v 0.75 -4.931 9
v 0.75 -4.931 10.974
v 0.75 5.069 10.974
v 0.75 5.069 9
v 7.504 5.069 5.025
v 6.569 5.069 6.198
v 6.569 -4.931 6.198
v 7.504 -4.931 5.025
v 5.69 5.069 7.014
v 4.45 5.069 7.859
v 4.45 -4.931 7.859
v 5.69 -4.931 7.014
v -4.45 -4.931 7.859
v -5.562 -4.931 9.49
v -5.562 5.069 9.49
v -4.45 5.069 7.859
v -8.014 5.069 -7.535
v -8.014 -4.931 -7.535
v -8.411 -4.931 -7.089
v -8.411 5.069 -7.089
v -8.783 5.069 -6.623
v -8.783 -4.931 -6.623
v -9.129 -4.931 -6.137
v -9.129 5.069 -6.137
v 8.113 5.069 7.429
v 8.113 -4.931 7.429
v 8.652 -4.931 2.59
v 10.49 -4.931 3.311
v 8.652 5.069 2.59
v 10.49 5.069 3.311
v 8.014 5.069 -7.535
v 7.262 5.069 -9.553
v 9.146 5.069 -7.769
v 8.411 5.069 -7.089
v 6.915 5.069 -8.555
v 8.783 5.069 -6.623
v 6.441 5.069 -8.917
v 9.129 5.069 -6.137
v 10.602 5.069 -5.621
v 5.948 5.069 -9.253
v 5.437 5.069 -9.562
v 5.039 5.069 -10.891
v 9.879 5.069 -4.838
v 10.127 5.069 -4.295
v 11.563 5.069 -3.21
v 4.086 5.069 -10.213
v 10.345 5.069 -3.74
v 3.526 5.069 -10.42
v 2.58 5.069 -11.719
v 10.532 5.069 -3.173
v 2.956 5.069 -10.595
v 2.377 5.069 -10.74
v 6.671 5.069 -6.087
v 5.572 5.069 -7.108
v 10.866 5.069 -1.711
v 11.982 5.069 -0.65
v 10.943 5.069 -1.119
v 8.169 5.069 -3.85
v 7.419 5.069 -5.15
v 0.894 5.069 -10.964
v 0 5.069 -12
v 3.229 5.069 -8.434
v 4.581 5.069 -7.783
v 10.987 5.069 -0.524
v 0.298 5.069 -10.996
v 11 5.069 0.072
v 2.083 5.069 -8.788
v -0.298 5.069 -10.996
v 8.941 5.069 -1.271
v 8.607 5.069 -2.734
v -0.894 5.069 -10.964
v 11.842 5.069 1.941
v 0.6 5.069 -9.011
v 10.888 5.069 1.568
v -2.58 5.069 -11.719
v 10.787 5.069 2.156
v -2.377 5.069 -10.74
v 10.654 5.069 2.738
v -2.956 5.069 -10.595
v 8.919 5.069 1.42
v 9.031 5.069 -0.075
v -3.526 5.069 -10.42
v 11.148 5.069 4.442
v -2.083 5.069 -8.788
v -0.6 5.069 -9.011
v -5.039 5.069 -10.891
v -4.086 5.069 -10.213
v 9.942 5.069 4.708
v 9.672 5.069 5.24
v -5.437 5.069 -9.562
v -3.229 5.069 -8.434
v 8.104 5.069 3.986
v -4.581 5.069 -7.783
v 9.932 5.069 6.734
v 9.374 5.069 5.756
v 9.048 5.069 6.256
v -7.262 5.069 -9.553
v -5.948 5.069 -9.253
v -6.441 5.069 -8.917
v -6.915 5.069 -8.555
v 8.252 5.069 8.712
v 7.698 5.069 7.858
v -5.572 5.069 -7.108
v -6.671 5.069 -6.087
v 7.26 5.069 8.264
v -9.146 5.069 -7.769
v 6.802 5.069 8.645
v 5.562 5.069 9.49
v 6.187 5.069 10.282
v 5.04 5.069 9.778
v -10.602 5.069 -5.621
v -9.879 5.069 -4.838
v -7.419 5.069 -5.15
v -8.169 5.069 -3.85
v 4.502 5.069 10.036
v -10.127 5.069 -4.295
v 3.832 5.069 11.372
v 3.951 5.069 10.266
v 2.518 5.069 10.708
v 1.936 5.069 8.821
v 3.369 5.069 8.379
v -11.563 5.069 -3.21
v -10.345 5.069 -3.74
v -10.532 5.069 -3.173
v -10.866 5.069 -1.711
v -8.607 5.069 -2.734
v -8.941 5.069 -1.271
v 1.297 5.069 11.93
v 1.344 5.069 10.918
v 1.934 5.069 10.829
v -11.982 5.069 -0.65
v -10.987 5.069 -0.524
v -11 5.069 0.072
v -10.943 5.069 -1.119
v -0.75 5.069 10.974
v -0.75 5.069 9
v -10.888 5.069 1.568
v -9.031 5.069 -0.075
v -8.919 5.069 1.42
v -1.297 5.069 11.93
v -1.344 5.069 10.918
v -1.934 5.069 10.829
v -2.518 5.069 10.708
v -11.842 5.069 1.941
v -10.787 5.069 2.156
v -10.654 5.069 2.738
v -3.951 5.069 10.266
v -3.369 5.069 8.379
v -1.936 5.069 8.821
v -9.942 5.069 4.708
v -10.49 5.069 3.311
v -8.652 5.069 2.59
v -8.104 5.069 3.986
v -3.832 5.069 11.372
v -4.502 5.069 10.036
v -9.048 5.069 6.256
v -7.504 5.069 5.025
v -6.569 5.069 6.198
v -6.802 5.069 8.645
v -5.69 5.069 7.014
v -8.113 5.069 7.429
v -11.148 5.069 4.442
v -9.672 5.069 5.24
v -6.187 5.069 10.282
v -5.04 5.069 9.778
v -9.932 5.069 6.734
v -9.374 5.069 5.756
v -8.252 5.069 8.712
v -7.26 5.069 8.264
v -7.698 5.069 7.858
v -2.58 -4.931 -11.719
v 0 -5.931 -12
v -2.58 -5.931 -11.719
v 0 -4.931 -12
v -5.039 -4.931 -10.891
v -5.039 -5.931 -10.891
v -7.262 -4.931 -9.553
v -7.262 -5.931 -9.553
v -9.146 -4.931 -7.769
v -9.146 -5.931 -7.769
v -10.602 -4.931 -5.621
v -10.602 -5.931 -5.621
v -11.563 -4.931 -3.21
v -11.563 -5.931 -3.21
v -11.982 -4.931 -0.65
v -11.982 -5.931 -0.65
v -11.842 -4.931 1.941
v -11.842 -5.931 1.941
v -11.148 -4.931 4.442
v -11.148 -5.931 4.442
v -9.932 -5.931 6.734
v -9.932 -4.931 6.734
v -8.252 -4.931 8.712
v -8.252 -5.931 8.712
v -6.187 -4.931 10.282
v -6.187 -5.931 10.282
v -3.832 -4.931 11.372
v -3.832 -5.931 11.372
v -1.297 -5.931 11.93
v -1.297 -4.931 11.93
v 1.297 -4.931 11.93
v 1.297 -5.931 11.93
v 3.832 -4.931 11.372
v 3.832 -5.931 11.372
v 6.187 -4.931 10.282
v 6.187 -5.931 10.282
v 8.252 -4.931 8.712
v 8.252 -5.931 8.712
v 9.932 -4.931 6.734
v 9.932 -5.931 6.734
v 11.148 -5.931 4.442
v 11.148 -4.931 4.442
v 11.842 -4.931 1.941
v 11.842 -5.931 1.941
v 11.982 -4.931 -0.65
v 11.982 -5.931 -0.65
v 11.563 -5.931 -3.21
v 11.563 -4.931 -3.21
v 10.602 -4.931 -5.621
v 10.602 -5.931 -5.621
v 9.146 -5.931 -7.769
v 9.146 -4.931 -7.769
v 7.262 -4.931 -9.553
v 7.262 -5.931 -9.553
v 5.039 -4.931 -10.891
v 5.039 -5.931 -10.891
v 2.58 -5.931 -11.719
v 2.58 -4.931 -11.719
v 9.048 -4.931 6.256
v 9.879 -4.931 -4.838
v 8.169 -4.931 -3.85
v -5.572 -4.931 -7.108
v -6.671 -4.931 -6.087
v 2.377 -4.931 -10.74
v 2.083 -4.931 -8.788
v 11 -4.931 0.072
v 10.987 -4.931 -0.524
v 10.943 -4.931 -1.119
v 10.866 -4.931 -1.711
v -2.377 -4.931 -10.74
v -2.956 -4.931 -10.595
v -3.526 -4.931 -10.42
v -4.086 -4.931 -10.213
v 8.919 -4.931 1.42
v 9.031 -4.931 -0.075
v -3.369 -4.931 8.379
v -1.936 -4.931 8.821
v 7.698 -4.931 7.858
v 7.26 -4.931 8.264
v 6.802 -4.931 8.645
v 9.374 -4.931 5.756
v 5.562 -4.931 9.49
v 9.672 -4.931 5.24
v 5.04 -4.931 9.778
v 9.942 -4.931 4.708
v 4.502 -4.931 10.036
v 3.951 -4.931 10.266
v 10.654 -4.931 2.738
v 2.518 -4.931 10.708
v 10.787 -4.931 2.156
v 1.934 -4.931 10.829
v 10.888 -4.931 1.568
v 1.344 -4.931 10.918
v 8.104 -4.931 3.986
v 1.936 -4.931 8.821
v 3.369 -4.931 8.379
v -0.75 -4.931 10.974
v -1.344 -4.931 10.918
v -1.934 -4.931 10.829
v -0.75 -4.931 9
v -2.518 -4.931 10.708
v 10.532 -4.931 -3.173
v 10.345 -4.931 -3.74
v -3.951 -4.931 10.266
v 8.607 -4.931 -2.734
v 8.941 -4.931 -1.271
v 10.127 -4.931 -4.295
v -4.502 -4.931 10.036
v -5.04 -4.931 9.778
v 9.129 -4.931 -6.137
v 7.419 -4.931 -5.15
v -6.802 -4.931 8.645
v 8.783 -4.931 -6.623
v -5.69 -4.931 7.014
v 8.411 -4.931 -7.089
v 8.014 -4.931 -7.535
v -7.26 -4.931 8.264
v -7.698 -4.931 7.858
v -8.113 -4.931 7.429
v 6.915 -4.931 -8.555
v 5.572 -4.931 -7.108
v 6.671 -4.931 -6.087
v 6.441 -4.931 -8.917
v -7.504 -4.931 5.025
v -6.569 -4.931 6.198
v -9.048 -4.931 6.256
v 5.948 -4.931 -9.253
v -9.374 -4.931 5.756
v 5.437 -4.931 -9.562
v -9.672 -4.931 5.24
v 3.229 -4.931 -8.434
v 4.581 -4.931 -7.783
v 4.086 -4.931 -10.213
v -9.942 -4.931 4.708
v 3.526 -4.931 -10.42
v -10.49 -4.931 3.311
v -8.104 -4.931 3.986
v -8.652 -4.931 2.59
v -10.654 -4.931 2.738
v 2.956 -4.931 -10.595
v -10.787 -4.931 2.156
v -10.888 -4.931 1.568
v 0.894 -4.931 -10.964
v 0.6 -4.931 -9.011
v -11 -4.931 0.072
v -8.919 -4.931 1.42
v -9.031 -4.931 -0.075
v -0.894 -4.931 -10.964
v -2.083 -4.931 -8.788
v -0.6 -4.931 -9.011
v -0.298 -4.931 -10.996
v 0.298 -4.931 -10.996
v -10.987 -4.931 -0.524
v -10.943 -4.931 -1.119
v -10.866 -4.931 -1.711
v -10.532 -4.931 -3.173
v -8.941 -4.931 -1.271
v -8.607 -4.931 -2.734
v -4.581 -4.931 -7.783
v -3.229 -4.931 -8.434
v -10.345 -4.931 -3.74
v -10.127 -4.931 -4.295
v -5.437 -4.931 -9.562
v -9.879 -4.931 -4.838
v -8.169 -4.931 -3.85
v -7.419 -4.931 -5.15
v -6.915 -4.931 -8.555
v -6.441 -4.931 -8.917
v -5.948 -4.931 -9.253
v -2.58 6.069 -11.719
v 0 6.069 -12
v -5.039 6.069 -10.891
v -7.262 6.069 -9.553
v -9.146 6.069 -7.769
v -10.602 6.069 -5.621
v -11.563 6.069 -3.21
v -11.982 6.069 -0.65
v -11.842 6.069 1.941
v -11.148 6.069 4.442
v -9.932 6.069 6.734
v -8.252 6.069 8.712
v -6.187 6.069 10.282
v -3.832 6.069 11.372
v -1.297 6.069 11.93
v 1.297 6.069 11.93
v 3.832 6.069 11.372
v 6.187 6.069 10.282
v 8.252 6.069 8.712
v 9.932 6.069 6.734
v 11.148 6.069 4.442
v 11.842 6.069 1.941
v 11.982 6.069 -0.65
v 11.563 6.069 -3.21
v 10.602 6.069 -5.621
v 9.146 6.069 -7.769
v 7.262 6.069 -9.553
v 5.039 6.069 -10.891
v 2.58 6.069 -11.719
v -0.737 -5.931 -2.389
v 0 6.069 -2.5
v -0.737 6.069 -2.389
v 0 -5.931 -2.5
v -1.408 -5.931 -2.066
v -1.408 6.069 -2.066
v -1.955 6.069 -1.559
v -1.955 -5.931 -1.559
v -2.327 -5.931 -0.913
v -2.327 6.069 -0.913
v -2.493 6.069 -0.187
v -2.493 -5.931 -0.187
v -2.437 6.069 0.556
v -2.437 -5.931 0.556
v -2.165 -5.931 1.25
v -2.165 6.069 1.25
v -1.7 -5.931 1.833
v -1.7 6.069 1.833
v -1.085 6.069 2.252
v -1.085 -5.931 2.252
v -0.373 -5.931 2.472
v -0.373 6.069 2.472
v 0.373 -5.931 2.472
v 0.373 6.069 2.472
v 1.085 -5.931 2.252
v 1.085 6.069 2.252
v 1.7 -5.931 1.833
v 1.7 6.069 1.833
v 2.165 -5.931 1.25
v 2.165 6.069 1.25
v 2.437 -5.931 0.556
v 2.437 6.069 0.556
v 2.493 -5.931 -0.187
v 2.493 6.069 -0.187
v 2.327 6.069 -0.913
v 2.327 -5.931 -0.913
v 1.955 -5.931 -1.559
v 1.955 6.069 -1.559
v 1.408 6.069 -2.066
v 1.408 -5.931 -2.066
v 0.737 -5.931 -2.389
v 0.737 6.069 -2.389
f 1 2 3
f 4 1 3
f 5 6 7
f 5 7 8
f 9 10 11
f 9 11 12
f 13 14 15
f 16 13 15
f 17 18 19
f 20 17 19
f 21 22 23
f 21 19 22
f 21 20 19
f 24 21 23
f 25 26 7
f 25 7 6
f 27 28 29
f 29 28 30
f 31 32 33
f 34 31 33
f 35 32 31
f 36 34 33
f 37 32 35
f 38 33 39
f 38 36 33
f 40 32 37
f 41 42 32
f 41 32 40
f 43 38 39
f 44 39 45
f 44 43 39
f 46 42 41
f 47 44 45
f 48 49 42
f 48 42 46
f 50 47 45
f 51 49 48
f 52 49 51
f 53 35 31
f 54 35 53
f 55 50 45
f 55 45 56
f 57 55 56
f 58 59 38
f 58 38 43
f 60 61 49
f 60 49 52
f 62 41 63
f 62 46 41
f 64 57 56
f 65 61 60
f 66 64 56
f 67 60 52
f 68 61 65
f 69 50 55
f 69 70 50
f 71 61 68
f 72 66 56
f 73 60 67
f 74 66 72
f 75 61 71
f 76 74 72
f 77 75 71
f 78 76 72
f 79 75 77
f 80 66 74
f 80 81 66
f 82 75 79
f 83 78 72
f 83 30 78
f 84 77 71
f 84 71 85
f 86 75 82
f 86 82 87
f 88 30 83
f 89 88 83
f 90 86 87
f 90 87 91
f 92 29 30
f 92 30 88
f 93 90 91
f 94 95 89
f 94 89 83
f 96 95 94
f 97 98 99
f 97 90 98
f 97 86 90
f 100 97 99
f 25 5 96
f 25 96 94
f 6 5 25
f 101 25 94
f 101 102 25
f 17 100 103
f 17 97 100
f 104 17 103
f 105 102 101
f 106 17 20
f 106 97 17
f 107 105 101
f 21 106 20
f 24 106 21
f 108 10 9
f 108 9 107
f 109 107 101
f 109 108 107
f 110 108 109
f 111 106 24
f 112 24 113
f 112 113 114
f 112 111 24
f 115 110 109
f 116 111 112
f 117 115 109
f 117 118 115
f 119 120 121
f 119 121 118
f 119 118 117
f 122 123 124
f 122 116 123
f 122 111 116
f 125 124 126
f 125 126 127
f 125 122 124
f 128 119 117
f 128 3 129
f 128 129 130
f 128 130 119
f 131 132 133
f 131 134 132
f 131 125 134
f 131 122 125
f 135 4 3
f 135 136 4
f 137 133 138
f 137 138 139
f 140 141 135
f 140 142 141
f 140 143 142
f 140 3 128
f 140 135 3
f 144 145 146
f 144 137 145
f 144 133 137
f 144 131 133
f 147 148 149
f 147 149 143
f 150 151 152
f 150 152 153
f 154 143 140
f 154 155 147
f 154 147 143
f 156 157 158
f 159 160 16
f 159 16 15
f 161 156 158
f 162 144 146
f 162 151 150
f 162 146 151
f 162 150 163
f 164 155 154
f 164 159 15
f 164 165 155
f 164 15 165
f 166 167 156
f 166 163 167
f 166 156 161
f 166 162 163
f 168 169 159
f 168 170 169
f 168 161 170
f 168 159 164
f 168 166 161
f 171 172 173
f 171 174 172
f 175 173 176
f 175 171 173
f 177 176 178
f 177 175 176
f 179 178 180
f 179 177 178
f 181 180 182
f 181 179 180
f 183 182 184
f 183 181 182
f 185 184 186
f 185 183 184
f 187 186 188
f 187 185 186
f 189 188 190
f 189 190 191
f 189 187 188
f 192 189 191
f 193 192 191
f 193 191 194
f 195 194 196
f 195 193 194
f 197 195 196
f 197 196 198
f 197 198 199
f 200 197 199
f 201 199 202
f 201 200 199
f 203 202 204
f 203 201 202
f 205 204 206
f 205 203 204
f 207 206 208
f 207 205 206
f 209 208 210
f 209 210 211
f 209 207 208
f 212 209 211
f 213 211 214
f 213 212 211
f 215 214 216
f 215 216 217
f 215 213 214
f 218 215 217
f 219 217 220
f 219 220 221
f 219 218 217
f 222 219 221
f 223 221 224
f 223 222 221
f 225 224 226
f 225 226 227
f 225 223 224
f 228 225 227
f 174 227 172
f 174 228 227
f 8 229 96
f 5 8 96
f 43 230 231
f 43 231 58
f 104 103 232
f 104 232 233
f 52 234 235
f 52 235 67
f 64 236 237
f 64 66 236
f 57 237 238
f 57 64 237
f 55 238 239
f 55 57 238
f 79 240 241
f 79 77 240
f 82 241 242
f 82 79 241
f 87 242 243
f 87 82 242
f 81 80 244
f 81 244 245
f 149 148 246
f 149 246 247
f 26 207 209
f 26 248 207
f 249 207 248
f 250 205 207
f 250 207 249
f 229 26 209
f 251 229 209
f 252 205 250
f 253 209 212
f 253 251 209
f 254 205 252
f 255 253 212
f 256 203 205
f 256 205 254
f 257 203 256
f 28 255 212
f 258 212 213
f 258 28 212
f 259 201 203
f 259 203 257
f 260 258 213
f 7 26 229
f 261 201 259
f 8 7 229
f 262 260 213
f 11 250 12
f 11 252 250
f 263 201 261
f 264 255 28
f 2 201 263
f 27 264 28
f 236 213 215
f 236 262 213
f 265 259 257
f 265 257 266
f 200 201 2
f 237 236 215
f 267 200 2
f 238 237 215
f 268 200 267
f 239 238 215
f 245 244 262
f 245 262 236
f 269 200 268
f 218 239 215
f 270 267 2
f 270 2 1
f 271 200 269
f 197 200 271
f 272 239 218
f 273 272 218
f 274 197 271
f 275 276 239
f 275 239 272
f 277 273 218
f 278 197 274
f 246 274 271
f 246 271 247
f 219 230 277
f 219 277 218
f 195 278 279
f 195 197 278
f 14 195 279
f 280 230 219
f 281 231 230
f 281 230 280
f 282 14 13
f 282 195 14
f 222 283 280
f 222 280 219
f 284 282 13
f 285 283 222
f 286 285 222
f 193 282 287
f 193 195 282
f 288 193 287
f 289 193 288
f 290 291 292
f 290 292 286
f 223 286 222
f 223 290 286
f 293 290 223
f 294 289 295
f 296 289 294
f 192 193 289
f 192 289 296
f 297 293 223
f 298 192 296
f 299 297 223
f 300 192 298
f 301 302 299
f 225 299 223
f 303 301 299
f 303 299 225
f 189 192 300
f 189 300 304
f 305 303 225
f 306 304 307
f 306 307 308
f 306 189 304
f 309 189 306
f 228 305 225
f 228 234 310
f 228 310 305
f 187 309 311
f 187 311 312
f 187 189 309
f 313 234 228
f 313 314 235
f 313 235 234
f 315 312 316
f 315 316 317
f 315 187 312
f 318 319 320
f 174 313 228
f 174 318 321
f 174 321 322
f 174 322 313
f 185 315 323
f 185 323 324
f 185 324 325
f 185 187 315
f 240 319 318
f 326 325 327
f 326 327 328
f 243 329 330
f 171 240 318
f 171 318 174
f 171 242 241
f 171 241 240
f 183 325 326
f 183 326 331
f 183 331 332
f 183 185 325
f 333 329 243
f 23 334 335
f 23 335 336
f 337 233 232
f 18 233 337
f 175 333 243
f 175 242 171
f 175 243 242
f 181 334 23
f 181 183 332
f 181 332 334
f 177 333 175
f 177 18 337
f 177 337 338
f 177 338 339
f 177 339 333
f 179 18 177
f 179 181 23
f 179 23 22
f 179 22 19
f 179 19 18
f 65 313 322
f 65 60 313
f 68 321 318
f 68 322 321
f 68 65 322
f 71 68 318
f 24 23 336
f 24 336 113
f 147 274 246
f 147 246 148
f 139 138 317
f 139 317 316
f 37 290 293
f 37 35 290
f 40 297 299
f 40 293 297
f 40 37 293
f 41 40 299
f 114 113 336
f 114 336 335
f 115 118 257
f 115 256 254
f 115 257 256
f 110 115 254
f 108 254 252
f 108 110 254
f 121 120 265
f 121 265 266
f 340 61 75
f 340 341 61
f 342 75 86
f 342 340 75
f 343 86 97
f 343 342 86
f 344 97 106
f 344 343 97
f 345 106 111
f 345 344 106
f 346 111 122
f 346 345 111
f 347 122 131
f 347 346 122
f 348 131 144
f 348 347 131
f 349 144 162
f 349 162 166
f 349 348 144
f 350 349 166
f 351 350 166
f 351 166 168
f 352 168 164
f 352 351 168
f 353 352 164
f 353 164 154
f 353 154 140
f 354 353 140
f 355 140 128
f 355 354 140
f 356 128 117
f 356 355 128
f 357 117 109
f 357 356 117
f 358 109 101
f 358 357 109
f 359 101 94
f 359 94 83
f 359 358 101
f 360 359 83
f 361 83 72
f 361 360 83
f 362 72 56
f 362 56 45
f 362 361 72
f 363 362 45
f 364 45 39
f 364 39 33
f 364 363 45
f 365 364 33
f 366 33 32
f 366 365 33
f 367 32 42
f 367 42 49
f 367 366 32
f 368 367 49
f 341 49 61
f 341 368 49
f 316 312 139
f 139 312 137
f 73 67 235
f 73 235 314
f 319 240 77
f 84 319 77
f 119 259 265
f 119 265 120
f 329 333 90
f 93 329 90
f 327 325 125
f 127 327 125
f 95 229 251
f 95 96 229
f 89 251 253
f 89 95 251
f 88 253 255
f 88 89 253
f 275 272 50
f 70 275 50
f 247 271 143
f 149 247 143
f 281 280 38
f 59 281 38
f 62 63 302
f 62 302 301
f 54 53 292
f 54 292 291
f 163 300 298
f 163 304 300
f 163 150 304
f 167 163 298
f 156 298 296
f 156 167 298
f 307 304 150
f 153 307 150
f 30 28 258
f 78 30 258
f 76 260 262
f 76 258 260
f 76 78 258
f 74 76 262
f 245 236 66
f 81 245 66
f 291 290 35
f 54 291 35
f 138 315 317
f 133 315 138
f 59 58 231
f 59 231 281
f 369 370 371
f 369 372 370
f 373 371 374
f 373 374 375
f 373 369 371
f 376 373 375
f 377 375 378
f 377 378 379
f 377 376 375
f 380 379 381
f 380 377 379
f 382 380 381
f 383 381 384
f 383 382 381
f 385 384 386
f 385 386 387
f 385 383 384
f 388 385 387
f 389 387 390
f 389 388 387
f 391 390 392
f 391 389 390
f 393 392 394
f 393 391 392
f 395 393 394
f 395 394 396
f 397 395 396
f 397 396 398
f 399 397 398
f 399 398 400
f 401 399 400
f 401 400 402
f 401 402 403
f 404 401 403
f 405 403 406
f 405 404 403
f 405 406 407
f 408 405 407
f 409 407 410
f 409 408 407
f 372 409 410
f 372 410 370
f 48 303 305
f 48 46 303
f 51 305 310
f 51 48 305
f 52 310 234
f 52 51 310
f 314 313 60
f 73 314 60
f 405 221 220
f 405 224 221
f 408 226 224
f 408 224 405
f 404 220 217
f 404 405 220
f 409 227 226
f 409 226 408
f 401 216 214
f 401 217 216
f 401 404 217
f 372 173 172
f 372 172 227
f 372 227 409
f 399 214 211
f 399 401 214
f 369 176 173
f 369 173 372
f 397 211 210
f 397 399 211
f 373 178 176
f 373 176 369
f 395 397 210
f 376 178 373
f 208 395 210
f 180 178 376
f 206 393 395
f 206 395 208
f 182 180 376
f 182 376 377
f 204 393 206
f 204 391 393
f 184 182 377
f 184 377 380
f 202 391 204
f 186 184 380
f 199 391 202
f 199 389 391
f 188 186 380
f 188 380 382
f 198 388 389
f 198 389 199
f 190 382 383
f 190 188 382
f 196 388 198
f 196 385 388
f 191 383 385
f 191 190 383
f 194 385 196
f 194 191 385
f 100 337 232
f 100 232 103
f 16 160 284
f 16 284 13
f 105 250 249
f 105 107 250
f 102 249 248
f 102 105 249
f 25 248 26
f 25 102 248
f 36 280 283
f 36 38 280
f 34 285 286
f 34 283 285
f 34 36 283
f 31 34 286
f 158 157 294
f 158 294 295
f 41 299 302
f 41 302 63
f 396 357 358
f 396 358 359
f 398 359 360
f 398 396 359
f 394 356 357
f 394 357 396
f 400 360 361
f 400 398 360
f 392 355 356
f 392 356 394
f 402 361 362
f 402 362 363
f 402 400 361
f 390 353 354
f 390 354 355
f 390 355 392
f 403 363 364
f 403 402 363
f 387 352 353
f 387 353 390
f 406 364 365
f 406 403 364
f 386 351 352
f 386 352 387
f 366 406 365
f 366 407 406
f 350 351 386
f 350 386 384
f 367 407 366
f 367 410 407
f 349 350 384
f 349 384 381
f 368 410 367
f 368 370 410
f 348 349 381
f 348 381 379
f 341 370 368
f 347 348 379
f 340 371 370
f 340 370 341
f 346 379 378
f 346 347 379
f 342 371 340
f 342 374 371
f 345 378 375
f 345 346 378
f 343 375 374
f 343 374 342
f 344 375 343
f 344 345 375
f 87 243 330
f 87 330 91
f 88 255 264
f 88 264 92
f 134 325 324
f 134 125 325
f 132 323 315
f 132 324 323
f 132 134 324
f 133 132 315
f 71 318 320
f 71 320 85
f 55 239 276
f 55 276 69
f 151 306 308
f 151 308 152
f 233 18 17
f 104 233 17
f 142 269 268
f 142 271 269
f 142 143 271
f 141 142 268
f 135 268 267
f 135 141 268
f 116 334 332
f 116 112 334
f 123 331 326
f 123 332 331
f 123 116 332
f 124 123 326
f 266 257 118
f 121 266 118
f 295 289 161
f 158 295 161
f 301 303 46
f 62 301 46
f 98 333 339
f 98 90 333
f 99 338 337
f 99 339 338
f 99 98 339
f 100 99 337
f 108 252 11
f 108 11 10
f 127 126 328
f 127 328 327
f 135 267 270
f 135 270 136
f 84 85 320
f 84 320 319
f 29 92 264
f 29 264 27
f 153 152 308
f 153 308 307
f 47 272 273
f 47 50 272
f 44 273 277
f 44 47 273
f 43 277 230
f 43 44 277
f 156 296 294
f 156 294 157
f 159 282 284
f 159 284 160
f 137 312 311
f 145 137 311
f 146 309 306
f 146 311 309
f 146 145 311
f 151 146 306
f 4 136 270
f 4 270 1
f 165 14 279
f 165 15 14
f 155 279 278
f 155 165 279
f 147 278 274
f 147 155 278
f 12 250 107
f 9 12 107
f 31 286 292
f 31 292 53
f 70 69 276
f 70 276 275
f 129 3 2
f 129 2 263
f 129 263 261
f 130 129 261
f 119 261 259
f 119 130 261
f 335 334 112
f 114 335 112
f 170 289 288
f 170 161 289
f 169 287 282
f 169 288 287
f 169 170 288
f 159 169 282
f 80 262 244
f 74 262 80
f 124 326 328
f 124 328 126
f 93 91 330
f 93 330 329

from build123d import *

# Parameters (mm, degrees)
SKETCH2_W          = 1.5
SKETCH2_H          = 10
CUT_EXTRUDE1_DEPTH = 2
CIRPATTERN1_COUNT  = 21


with BuildPart() as part:
    # Sketch1 → Revolve1 (revolve)
    with BuildSketch(Plane.XY, mode=Mode.PRIVATE) as revolve1_sk:
        Polygon((2.5, -5.930921053), (4.177631579, -5.930921053), (12, -5.930921053), (12, -4.930921053), (11, -4.930921053), (11, 5.069078947), (12, 5.069078947), (12, 6.069078947), (4.177631579, 6.069078947), (2.5, 6.069078947), align=None)
    revolve(revolve1_sk.sketch.rotate(Axis((0, 0, 0), (0, 1, 0)), 90), axis=Axis((0, 0, 0), (0, 1, 0)))  # turned: the seam where the file's is

    # Sketch2 → Cut-Extrude1 (cut)
    with BuildSketch(Plane.XY.offset(11)):
        with Locations((0, 0.069078947)):
            Rectangle(SKETCH2_W, SKETCH2_H)
    cut_extrude1 = extrude(amount=-CUT_EXTRUDE1_DEPTH, mode=Mode.SUBTRACT)

    # CirPattern1: Cut-Extrude1 ×21 about axis
    cirpattern1_axis = Axis((0, 0, 0), (0, 1, 0))
    for i in range(1, CIRPATTERN1_COUNT):
        add(cut_extrude1.rotate(cirpattern1_axis, i * 360 / CIRPATTERN1_COUNT), mode=Mode.SUBTRACT)


solid = part.part
